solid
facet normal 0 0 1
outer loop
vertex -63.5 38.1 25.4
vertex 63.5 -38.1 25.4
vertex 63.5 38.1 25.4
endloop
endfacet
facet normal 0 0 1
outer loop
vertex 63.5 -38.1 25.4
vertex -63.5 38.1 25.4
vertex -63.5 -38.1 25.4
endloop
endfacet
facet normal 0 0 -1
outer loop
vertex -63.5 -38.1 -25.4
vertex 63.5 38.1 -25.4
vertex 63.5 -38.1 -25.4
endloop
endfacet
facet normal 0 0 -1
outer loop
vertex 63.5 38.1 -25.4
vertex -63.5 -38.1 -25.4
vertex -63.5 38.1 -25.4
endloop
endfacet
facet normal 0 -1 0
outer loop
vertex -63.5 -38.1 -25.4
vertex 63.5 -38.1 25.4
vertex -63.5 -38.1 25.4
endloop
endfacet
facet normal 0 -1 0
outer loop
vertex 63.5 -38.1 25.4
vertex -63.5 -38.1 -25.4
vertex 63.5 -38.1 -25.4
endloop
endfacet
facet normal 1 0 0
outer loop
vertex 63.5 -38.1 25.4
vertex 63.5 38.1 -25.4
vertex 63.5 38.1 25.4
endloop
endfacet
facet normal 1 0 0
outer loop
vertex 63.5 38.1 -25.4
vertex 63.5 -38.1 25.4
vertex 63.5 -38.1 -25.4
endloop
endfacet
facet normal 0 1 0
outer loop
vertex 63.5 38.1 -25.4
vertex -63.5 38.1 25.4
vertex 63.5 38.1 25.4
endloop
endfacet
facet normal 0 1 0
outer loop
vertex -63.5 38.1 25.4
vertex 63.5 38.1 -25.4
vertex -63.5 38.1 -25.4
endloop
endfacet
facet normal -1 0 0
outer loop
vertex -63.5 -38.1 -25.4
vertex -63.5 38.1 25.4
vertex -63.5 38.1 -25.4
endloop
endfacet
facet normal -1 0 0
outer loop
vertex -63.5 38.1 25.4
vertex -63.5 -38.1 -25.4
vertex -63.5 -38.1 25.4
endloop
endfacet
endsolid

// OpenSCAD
// ========================================
// a 5 by 3 by 2 inch box
// NeuroCAD canonical IR; dimensions are millimetres
// ========================================
$fn = 48;

cube(size=[127, 76.2, 50.8], center=true);
